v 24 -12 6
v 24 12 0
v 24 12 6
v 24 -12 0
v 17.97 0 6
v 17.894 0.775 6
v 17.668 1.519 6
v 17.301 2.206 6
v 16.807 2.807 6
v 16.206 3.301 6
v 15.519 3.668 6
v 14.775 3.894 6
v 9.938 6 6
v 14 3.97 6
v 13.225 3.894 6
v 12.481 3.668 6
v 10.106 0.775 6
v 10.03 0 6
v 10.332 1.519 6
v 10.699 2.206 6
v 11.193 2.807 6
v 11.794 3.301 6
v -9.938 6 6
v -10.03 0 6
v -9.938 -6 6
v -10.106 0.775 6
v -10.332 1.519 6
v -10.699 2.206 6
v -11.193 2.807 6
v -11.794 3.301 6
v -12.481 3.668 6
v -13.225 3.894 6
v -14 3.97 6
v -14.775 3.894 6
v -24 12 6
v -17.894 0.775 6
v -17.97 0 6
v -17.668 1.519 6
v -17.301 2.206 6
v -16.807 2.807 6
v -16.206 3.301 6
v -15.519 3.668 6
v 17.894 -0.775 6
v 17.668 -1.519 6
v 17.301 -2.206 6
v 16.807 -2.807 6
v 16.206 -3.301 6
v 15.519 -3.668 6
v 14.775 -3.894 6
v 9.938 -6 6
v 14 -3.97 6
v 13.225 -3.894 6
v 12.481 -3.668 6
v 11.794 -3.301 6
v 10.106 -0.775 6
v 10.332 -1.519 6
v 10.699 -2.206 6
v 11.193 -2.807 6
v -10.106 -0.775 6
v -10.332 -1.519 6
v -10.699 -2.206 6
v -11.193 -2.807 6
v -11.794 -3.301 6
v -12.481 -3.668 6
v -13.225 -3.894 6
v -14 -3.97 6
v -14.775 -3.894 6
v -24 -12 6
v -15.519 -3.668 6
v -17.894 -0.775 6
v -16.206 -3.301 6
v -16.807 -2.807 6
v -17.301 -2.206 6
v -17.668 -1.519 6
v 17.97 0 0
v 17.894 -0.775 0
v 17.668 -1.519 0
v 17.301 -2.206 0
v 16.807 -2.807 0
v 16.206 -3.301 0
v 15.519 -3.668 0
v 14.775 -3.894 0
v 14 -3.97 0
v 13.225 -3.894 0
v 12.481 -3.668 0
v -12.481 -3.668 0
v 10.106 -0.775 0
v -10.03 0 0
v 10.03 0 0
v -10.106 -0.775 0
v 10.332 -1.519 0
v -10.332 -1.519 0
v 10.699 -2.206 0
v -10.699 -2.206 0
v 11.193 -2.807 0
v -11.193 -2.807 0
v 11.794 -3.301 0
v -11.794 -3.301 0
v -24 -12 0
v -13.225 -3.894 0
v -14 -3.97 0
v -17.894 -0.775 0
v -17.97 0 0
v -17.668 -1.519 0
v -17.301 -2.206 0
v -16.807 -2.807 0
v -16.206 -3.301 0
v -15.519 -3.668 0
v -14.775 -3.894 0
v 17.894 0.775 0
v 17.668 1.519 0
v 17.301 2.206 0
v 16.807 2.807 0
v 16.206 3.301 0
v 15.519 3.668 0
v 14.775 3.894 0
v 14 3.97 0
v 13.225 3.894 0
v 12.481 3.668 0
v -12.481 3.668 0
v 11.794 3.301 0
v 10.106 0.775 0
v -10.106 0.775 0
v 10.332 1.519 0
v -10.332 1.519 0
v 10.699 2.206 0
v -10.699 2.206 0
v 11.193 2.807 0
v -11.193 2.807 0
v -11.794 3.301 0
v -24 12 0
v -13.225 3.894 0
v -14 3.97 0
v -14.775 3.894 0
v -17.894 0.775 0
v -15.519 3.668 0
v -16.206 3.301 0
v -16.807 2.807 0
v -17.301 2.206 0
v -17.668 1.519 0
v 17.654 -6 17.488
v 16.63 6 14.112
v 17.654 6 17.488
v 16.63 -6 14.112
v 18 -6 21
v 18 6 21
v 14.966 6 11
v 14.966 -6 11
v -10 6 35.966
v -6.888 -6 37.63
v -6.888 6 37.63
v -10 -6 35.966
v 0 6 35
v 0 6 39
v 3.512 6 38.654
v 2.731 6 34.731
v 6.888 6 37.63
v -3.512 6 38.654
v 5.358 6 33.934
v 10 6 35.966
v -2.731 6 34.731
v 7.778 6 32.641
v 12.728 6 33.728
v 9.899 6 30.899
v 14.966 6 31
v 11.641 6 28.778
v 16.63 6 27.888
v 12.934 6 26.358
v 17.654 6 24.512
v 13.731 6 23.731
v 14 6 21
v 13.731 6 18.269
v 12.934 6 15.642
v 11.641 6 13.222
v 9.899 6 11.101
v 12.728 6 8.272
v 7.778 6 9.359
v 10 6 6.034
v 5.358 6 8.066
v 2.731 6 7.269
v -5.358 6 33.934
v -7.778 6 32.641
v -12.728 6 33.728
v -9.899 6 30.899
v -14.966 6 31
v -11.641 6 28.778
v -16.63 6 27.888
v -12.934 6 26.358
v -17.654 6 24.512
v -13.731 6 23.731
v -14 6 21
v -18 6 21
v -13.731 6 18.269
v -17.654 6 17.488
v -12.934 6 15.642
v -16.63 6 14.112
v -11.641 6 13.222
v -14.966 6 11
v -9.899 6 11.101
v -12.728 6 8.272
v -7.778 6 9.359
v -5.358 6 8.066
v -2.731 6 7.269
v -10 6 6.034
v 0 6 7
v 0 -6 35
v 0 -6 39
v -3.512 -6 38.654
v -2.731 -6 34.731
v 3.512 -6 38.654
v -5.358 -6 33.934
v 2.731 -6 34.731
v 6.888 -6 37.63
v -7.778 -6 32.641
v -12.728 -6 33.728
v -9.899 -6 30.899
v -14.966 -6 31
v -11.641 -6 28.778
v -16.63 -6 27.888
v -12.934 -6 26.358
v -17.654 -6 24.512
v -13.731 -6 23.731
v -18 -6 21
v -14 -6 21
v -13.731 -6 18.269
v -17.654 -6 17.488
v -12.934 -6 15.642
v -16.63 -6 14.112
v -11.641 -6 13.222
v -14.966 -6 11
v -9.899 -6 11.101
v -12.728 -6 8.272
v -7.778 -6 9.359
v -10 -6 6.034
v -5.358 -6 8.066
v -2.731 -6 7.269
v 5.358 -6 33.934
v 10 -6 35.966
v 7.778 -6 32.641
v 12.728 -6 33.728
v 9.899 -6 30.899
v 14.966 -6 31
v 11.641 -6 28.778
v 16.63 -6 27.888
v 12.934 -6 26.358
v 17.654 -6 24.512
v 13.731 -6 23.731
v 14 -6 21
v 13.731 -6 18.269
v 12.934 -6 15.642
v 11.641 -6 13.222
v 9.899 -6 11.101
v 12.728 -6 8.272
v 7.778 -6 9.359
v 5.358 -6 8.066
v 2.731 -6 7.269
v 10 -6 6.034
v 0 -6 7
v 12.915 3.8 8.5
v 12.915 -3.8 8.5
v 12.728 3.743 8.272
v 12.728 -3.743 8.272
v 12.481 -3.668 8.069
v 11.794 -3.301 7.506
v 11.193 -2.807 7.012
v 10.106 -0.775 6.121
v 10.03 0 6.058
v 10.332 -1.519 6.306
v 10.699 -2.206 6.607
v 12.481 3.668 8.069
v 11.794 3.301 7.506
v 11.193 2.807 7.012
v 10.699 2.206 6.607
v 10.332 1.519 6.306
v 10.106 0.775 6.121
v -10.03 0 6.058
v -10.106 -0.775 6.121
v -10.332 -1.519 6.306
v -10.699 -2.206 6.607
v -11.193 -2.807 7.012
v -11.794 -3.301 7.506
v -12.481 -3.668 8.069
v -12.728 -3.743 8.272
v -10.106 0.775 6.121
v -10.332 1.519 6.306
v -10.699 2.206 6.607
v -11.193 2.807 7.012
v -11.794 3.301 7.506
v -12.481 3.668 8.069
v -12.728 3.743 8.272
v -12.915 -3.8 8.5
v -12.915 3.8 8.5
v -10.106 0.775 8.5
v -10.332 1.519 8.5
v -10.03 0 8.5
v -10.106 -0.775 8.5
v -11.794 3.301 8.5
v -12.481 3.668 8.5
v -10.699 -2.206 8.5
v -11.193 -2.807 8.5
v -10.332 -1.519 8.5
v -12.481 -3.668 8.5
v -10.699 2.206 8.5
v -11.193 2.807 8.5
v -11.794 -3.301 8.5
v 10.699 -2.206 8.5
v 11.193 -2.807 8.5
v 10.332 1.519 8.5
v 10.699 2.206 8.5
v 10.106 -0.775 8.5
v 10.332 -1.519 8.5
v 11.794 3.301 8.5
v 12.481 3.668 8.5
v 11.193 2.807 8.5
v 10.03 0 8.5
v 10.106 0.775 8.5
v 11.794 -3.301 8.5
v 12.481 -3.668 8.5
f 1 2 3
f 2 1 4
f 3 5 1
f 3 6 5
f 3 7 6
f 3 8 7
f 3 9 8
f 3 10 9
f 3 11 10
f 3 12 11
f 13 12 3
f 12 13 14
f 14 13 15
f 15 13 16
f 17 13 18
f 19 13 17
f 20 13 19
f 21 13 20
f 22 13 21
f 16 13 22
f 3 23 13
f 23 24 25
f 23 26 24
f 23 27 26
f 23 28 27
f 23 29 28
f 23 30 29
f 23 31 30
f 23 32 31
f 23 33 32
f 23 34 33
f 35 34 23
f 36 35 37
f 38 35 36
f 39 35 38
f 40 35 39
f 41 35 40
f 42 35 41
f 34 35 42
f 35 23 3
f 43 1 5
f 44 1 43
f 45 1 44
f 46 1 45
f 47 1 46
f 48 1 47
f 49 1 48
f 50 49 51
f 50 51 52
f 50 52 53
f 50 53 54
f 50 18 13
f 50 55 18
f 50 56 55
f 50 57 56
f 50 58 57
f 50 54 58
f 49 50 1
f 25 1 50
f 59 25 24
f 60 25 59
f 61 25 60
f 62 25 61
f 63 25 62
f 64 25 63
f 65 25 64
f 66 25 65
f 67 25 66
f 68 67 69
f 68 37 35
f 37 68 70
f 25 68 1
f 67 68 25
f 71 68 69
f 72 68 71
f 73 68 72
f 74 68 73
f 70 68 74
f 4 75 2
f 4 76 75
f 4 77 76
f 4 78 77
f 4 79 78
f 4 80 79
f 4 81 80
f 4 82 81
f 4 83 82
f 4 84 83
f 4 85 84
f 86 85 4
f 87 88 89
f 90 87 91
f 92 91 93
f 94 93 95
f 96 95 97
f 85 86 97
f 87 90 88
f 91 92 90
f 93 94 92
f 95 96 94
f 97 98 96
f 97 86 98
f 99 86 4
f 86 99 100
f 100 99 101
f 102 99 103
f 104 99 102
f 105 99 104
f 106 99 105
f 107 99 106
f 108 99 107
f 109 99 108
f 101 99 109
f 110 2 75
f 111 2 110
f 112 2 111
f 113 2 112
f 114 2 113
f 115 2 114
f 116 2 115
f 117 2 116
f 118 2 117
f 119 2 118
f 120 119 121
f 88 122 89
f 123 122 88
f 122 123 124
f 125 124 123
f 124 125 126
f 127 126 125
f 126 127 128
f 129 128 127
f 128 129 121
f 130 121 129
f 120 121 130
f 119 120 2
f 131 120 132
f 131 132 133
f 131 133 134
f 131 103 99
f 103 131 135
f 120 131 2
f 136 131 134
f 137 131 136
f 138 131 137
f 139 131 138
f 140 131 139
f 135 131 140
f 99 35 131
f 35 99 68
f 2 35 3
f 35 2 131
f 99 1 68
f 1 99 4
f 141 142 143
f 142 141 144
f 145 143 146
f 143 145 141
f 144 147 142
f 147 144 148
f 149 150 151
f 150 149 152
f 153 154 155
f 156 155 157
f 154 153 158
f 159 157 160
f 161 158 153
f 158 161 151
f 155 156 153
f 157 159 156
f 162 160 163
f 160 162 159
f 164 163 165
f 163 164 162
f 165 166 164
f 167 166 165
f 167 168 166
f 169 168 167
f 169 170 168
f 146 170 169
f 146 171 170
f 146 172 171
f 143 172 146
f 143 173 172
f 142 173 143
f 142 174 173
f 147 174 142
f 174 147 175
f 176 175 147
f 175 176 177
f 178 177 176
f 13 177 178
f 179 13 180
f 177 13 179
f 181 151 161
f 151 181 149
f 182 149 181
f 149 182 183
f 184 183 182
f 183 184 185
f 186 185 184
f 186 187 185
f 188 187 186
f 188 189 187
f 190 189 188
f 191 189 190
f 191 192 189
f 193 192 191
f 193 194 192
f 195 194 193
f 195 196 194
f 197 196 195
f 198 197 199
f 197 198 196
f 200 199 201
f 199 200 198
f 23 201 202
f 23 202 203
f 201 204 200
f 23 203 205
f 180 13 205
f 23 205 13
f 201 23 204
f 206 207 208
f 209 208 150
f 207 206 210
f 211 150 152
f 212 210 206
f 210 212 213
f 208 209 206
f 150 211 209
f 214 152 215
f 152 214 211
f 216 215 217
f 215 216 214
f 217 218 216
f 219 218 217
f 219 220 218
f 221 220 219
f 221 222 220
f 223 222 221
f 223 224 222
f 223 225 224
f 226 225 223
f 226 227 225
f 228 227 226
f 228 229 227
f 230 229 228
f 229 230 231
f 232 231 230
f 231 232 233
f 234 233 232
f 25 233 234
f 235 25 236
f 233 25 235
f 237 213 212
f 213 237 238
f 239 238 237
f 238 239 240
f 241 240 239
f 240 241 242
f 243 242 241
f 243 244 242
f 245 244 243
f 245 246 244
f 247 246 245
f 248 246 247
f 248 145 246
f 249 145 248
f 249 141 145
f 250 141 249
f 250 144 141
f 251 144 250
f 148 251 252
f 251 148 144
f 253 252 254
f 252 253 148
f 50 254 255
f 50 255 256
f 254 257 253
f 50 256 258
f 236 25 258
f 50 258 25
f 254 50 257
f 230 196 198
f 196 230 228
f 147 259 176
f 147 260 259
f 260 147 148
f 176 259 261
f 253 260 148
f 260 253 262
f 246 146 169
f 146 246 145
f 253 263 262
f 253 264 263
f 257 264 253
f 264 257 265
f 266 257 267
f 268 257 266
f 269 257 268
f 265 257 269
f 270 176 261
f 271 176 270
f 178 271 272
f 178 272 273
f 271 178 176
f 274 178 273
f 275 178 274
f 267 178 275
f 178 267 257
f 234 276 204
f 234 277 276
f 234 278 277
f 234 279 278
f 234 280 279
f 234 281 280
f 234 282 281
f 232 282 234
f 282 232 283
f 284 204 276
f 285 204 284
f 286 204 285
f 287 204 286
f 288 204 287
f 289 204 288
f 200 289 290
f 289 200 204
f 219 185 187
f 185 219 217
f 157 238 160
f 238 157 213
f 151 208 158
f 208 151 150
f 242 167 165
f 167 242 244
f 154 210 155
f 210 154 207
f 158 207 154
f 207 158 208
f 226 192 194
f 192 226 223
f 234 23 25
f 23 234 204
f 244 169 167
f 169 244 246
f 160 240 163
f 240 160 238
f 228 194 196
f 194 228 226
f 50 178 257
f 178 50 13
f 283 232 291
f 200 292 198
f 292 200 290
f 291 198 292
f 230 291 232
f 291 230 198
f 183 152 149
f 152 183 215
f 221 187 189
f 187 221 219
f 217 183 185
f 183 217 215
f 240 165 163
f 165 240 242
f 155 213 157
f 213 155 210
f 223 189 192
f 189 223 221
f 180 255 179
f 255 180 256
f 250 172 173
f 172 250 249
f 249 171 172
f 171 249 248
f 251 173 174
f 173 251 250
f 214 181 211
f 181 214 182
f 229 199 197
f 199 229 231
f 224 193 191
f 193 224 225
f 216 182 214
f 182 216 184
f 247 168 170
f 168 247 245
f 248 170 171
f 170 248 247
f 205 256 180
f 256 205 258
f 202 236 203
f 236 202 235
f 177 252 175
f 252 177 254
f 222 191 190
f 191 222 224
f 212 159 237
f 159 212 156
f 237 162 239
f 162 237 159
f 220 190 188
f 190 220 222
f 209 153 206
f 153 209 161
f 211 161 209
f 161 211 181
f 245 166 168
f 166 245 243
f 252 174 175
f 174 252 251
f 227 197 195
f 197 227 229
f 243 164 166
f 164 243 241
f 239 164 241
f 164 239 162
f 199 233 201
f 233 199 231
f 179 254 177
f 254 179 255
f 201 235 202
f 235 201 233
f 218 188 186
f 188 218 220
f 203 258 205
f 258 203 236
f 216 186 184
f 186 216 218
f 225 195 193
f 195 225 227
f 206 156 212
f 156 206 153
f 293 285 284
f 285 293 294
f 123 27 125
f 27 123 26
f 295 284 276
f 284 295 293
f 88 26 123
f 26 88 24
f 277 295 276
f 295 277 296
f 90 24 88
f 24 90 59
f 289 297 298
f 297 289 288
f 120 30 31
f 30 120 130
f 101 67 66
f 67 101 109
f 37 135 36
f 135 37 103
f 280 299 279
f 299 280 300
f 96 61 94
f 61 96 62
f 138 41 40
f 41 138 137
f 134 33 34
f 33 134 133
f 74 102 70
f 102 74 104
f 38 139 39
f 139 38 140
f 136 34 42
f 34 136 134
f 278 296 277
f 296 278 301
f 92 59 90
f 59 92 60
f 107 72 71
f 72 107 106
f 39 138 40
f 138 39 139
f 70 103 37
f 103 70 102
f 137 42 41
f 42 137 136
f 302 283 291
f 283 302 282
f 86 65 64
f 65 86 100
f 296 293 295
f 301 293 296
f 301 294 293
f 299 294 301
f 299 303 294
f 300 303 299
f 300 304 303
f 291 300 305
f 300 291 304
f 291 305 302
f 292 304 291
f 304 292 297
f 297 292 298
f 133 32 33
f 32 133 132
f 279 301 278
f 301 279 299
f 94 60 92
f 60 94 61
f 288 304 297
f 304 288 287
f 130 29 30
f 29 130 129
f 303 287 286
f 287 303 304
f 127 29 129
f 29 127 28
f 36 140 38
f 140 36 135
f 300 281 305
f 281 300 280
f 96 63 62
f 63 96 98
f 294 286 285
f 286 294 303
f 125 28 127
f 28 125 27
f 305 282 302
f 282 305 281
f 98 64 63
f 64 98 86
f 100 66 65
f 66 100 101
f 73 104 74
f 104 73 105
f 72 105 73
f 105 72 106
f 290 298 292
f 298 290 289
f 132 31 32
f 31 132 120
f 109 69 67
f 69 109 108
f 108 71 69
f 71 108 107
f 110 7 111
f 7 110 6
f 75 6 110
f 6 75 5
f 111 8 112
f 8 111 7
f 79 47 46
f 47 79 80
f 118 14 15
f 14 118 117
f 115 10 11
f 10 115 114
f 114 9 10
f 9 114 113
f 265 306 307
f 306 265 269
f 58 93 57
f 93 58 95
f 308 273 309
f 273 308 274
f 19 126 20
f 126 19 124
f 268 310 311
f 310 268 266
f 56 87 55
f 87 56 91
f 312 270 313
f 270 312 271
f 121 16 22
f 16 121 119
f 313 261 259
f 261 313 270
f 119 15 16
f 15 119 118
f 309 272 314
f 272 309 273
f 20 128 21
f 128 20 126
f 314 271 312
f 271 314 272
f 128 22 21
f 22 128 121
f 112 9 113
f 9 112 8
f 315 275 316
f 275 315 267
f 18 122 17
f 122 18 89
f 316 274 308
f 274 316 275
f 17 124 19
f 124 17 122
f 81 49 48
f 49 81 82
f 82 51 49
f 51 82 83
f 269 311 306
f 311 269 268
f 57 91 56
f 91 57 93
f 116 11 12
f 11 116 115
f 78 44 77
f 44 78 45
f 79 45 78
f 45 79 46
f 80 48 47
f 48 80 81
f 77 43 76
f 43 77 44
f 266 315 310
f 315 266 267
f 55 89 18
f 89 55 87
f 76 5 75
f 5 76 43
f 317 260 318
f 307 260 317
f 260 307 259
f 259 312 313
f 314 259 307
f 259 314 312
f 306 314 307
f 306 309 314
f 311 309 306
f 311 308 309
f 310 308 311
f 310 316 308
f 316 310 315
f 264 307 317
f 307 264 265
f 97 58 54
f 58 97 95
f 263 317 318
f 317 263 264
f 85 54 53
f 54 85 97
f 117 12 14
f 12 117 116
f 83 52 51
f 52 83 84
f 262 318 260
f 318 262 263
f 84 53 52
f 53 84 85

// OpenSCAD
$fn = 32;

// ----------------------------------------------------------------------
// Deck eye: 36 mm eye on a 48 mm base
// ----------------------------------------------------------------------

// --- parameters (mm) ---
base_l = 48;              // base length
base_w = 24;              // base width
base_t = 6;               // base thickness
eye_r = 18;               // eye outside radius
eye_bore = 28;            // eye bore diameter
eye_w = 12;               // eye thickness
eye_z = 21;               // eye centre height
holes_d = 7.94;           // fixing holes
hole_x = 14;              // fixing hole spacing

difference() {
  union() {
    translate([-24, -12, 0]) cube([base_l, base_w, base_t]);
    /* eye standing upright, its foot sunk 3 mm into the base */
    translate([0, -6, 21]) rotate([-90, 0, 0]) cylinder(h = 12, d = 36);
  }
  /* eye bore, 2.5 mm clear of both faces */
  translate([0, -8.5, 21]) rotate([-90, 0, 0]) cylinder(h = 17, d = 28);
  translate([-14, 0, -2.5]) cylinder(h = base_t + 5, d = holes_d);
  translate([14, 0, -2.5]) cylinder(h = base_t + 5, d = holes_d);
}
